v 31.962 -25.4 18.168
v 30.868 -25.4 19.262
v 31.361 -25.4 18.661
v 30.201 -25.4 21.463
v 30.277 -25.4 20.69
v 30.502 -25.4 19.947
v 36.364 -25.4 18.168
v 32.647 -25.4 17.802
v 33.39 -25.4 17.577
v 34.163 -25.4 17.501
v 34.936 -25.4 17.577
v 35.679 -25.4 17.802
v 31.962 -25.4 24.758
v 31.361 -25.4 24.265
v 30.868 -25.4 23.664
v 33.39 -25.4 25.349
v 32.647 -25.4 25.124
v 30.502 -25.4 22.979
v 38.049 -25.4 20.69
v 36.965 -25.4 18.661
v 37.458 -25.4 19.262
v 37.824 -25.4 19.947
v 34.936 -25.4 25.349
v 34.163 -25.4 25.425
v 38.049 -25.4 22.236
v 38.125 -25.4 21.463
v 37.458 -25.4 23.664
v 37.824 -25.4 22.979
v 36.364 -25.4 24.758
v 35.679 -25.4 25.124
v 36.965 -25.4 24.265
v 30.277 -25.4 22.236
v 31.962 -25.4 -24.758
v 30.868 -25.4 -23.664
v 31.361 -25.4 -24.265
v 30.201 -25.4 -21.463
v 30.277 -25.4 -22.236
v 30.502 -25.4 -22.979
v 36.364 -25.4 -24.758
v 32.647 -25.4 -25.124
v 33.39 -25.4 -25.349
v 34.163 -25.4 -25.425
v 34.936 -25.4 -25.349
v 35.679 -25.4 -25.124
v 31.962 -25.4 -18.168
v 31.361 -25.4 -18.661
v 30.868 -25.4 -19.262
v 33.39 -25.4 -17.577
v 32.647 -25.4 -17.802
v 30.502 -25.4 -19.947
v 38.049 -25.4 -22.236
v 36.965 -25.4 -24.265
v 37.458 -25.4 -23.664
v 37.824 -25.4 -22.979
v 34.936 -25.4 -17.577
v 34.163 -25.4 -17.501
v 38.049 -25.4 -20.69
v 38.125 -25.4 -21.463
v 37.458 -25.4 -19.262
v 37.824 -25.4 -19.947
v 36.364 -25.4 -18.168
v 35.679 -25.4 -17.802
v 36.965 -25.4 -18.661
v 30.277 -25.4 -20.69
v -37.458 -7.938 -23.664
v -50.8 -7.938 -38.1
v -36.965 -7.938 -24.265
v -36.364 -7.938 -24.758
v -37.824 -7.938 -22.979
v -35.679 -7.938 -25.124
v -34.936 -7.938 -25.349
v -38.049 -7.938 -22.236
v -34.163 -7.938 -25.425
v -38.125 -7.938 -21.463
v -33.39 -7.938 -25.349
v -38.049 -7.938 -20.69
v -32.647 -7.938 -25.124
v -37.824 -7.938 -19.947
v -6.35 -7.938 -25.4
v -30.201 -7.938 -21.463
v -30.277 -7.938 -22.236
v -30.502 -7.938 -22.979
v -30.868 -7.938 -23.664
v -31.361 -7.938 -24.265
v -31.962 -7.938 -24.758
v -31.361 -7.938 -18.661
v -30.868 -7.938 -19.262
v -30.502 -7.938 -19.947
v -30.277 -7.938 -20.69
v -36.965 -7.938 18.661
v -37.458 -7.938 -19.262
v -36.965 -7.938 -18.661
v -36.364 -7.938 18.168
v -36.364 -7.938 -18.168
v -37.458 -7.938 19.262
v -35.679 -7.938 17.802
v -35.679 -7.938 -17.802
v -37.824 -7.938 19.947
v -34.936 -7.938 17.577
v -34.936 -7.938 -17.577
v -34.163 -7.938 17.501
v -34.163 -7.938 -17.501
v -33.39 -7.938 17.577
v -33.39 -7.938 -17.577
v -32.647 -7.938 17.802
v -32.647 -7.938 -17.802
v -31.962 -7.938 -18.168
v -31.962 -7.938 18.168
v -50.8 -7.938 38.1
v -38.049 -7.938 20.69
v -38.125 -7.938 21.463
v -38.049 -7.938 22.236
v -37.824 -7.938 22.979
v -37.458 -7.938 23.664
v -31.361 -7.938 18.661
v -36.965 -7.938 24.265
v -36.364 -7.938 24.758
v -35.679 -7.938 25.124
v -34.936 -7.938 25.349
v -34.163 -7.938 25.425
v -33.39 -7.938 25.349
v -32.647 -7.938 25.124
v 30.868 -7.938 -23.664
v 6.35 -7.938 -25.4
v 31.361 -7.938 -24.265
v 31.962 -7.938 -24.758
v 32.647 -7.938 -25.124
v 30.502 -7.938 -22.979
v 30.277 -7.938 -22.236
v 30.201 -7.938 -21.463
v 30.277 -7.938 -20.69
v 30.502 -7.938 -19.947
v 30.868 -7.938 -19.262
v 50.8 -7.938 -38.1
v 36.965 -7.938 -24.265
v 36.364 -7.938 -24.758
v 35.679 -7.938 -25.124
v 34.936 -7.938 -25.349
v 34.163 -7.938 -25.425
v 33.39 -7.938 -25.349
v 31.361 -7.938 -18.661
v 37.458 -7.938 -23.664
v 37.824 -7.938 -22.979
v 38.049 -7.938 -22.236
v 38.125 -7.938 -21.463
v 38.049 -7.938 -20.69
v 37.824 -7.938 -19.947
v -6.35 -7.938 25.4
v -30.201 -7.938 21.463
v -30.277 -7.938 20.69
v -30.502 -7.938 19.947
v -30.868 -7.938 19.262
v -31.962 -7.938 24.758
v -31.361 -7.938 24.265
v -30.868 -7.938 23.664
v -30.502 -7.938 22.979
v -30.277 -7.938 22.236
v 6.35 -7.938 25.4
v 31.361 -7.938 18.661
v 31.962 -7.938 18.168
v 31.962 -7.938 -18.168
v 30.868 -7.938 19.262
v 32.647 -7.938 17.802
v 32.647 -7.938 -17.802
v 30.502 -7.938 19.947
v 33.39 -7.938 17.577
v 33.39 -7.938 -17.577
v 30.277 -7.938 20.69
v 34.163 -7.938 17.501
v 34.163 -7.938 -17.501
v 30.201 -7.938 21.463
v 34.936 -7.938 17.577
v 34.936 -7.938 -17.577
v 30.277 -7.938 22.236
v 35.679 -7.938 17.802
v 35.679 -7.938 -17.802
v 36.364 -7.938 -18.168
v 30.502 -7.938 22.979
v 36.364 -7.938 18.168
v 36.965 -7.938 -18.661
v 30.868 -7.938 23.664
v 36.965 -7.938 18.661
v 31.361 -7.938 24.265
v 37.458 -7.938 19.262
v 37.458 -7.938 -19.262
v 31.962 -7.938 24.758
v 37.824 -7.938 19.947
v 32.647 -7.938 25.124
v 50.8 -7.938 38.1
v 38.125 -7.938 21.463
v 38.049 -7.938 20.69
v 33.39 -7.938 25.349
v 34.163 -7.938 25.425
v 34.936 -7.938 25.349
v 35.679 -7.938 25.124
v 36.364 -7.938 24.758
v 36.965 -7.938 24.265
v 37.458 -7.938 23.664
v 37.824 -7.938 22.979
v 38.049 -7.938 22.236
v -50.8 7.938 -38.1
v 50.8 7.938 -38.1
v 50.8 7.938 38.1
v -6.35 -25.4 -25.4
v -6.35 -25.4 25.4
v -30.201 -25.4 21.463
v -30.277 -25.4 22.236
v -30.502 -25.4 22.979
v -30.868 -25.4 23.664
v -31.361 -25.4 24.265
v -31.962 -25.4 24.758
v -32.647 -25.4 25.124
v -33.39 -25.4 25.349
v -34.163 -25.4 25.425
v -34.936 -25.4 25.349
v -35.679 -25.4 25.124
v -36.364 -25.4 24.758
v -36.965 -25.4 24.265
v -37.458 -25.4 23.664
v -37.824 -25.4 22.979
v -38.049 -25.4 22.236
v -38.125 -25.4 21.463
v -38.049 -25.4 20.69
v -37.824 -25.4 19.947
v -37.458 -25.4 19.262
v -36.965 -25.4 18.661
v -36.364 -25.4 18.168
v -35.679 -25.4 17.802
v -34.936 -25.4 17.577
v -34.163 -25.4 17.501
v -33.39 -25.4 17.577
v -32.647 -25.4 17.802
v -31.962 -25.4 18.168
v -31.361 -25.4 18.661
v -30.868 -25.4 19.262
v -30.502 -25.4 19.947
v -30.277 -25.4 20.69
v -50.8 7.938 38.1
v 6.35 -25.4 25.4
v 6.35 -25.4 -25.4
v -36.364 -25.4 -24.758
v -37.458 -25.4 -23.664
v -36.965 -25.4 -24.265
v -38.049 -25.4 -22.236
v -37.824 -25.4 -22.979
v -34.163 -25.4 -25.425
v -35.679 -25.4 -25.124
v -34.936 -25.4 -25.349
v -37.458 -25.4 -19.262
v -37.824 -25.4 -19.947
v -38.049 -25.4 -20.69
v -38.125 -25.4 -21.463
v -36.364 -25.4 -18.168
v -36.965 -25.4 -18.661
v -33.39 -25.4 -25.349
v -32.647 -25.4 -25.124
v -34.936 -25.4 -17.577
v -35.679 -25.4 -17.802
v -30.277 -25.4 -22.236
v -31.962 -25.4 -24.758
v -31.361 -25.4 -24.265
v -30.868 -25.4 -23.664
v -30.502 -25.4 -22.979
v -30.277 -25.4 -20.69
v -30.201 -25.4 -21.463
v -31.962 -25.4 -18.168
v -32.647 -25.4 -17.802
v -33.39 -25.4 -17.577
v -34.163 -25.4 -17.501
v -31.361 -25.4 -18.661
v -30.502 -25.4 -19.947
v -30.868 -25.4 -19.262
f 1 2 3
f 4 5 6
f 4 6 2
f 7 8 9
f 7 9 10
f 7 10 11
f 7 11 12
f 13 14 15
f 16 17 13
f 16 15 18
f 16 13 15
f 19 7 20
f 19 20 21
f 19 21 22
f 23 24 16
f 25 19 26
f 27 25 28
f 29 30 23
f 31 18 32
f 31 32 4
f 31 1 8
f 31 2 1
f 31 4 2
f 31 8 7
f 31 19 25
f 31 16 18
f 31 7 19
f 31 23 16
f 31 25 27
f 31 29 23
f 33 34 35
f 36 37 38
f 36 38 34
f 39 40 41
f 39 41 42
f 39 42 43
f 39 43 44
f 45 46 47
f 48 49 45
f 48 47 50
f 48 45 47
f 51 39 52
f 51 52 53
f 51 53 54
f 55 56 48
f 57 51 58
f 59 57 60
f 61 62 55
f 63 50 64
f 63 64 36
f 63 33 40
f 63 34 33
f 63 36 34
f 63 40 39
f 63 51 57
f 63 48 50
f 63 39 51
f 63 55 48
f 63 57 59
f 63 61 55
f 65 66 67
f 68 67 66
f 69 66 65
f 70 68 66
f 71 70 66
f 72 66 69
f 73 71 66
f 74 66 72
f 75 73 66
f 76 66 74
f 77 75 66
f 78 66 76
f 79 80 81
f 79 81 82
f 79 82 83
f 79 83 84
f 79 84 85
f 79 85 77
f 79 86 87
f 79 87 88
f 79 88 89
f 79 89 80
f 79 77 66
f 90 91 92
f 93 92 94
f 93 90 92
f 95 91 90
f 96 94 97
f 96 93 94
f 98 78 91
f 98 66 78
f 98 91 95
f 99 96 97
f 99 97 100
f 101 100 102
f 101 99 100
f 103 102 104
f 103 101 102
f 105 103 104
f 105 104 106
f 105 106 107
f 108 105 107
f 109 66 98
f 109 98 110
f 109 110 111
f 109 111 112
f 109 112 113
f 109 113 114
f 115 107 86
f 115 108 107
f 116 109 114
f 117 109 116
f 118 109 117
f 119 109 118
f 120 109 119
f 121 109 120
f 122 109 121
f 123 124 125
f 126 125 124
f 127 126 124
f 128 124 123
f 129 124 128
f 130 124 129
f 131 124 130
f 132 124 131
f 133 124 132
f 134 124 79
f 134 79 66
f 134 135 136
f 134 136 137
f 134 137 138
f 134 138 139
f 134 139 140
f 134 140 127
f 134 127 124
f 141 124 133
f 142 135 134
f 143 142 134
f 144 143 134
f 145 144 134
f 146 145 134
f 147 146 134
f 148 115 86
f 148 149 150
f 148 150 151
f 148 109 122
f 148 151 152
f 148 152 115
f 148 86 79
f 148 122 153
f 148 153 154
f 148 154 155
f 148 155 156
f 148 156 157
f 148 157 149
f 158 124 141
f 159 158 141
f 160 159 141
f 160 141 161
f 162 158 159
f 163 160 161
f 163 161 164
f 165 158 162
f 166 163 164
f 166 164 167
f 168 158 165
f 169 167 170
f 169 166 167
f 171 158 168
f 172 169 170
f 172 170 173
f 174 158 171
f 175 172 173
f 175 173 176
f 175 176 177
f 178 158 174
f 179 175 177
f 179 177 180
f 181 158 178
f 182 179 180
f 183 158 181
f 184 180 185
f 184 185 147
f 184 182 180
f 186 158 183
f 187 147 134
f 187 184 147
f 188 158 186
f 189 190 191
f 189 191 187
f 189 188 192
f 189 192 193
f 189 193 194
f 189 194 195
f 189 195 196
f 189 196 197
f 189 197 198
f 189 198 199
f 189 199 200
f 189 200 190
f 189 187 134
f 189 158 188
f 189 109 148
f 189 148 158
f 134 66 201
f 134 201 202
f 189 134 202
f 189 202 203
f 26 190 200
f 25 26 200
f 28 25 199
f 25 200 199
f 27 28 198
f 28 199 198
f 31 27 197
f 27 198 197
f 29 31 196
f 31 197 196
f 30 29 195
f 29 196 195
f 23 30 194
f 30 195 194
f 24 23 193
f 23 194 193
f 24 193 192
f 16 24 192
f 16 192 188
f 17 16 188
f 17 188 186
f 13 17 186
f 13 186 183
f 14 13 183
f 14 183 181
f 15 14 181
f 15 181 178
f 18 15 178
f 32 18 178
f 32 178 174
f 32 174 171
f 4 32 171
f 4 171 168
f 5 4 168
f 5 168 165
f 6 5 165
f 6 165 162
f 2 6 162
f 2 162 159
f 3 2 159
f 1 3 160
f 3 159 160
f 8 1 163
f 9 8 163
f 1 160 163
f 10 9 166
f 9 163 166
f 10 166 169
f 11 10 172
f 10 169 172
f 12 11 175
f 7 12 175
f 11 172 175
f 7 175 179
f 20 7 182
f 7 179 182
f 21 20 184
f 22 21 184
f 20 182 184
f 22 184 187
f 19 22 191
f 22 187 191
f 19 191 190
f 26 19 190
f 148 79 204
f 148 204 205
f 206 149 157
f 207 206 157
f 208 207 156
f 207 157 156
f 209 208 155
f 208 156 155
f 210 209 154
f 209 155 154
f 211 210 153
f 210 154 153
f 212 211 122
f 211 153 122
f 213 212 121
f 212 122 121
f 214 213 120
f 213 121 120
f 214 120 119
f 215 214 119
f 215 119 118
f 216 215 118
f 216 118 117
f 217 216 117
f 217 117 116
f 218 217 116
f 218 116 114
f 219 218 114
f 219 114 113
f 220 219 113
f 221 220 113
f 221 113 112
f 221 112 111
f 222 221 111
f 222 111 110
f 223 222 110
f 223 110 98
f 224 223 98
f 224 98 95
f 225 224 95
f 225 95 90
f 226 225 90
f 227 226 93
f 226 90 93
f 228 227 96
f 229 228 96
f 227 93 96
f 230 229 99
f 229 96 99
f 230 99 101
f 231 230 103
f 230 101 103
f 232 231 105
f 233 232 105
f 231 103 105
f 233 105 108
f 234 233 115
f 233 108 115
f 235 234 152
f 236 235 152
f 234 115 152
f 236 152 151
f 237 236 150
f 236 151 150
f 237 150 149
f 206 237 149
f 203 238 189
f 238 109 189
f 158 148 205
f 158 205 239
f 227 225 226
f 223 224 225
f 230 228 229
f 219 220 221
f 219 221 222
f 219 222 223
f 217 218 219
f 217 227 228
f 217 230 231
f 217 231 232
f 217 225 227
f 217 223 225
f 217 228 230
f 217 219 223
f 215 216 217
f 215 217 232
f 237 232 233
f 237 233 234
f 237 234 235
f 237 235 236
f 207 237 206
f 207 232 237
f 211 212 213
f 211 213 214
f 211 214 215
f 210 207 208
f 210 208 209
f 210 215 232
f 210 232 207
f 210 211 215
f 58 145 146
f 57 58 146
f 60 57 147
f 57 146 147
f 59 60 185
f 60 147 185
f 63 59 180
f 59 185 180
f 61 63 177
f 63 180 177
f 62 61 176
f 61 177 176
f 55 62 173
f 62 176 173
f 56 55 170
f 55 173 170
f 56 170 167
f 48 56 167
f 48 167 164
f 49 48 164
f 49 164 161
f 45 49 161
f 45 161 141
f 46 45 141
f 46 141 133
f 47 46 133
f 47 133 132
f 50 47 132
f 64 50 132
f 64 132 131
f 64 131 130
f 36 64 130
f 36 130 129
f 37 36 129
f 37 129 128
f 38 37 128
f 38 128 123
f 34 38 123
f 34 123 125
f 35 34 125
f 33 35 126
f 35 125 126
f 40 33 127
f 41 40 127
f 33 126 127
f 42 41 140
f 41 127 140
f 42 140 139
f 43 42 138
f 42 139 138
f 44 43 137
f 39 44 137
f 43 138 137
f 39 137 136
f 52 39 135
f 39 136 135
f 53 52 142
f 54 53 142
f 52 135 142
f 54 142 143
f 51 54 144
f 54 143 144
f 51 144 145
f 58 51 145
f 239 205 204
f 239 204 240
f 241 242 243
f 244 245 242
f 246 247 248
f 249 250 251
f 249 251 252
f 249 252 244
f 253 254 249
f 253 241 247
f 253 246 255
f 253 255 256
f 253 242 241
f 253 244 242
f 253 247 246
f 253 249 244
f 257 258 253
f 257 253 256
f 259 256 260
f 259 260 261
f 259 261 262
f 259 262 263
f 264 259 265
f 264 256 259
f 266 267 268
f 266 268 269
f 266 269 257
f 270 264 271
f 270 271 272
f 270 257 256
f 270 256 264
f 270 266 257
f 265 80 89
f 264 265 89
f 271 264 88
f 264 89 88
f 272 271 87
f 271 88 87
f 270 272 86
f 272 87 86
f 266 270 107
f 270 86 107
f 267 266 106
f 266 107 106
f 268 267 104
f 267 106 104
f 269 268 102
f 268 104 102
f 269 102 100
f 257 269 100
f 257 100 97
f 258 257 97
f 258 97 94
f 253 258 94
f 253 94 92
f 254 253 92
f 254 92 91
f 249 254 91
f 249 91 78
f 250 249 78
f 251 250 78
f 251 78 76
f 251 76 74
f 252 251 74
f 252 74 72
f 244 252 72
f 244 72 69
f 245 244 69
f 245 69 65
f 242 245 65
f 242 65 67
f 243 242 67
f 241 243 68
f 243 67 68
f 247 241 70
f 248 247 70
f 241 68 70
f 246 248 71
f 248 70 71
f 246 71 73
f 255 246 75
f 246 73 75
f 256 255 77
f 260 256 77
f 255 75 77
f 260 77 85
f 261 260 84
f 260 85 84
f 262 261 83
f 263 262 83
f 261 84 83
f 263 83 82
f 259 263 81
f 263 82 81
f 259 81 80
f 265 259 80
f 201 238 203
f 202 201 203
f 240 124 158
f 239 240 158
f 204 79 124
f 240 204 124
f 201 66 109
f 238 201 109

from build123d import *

# Parameters (mm, degrees)
F0_W     = 101.6
F0_H     = 76.2
F1_DEPTH = 7.9375
F2_R     = 3.9624
F2_W     = 12.7
F2_H     = 50.8
F3_DEPTH = 25.4


with BuildPart() as f1:
    # F0 (on Front) → F1 (new body, symmetric)
    with BuildSketch(Plane.XZ):
        Rectangle(F0_W, F0_H)
    extrude(amount=F1_DEPTH, both=True)

    # F2 (on Front) → F3 (join)
    with BuildSketch(Plane.XZ):
        with Locations((34.163, 21.463)):
            Circle(F2_R)
        with Locations((34.163, -21.463)):
            Circle(F2_R)
        Rectangle(F2_W, F2_H)
        with Locations((-34.163, 21.463)):
            Circle(F2_R)
        with Locations((-34.163, -21.463)):
            Circle(F2_R)
    extrude(amount=F3_DEPTH)


solid = f1.part
